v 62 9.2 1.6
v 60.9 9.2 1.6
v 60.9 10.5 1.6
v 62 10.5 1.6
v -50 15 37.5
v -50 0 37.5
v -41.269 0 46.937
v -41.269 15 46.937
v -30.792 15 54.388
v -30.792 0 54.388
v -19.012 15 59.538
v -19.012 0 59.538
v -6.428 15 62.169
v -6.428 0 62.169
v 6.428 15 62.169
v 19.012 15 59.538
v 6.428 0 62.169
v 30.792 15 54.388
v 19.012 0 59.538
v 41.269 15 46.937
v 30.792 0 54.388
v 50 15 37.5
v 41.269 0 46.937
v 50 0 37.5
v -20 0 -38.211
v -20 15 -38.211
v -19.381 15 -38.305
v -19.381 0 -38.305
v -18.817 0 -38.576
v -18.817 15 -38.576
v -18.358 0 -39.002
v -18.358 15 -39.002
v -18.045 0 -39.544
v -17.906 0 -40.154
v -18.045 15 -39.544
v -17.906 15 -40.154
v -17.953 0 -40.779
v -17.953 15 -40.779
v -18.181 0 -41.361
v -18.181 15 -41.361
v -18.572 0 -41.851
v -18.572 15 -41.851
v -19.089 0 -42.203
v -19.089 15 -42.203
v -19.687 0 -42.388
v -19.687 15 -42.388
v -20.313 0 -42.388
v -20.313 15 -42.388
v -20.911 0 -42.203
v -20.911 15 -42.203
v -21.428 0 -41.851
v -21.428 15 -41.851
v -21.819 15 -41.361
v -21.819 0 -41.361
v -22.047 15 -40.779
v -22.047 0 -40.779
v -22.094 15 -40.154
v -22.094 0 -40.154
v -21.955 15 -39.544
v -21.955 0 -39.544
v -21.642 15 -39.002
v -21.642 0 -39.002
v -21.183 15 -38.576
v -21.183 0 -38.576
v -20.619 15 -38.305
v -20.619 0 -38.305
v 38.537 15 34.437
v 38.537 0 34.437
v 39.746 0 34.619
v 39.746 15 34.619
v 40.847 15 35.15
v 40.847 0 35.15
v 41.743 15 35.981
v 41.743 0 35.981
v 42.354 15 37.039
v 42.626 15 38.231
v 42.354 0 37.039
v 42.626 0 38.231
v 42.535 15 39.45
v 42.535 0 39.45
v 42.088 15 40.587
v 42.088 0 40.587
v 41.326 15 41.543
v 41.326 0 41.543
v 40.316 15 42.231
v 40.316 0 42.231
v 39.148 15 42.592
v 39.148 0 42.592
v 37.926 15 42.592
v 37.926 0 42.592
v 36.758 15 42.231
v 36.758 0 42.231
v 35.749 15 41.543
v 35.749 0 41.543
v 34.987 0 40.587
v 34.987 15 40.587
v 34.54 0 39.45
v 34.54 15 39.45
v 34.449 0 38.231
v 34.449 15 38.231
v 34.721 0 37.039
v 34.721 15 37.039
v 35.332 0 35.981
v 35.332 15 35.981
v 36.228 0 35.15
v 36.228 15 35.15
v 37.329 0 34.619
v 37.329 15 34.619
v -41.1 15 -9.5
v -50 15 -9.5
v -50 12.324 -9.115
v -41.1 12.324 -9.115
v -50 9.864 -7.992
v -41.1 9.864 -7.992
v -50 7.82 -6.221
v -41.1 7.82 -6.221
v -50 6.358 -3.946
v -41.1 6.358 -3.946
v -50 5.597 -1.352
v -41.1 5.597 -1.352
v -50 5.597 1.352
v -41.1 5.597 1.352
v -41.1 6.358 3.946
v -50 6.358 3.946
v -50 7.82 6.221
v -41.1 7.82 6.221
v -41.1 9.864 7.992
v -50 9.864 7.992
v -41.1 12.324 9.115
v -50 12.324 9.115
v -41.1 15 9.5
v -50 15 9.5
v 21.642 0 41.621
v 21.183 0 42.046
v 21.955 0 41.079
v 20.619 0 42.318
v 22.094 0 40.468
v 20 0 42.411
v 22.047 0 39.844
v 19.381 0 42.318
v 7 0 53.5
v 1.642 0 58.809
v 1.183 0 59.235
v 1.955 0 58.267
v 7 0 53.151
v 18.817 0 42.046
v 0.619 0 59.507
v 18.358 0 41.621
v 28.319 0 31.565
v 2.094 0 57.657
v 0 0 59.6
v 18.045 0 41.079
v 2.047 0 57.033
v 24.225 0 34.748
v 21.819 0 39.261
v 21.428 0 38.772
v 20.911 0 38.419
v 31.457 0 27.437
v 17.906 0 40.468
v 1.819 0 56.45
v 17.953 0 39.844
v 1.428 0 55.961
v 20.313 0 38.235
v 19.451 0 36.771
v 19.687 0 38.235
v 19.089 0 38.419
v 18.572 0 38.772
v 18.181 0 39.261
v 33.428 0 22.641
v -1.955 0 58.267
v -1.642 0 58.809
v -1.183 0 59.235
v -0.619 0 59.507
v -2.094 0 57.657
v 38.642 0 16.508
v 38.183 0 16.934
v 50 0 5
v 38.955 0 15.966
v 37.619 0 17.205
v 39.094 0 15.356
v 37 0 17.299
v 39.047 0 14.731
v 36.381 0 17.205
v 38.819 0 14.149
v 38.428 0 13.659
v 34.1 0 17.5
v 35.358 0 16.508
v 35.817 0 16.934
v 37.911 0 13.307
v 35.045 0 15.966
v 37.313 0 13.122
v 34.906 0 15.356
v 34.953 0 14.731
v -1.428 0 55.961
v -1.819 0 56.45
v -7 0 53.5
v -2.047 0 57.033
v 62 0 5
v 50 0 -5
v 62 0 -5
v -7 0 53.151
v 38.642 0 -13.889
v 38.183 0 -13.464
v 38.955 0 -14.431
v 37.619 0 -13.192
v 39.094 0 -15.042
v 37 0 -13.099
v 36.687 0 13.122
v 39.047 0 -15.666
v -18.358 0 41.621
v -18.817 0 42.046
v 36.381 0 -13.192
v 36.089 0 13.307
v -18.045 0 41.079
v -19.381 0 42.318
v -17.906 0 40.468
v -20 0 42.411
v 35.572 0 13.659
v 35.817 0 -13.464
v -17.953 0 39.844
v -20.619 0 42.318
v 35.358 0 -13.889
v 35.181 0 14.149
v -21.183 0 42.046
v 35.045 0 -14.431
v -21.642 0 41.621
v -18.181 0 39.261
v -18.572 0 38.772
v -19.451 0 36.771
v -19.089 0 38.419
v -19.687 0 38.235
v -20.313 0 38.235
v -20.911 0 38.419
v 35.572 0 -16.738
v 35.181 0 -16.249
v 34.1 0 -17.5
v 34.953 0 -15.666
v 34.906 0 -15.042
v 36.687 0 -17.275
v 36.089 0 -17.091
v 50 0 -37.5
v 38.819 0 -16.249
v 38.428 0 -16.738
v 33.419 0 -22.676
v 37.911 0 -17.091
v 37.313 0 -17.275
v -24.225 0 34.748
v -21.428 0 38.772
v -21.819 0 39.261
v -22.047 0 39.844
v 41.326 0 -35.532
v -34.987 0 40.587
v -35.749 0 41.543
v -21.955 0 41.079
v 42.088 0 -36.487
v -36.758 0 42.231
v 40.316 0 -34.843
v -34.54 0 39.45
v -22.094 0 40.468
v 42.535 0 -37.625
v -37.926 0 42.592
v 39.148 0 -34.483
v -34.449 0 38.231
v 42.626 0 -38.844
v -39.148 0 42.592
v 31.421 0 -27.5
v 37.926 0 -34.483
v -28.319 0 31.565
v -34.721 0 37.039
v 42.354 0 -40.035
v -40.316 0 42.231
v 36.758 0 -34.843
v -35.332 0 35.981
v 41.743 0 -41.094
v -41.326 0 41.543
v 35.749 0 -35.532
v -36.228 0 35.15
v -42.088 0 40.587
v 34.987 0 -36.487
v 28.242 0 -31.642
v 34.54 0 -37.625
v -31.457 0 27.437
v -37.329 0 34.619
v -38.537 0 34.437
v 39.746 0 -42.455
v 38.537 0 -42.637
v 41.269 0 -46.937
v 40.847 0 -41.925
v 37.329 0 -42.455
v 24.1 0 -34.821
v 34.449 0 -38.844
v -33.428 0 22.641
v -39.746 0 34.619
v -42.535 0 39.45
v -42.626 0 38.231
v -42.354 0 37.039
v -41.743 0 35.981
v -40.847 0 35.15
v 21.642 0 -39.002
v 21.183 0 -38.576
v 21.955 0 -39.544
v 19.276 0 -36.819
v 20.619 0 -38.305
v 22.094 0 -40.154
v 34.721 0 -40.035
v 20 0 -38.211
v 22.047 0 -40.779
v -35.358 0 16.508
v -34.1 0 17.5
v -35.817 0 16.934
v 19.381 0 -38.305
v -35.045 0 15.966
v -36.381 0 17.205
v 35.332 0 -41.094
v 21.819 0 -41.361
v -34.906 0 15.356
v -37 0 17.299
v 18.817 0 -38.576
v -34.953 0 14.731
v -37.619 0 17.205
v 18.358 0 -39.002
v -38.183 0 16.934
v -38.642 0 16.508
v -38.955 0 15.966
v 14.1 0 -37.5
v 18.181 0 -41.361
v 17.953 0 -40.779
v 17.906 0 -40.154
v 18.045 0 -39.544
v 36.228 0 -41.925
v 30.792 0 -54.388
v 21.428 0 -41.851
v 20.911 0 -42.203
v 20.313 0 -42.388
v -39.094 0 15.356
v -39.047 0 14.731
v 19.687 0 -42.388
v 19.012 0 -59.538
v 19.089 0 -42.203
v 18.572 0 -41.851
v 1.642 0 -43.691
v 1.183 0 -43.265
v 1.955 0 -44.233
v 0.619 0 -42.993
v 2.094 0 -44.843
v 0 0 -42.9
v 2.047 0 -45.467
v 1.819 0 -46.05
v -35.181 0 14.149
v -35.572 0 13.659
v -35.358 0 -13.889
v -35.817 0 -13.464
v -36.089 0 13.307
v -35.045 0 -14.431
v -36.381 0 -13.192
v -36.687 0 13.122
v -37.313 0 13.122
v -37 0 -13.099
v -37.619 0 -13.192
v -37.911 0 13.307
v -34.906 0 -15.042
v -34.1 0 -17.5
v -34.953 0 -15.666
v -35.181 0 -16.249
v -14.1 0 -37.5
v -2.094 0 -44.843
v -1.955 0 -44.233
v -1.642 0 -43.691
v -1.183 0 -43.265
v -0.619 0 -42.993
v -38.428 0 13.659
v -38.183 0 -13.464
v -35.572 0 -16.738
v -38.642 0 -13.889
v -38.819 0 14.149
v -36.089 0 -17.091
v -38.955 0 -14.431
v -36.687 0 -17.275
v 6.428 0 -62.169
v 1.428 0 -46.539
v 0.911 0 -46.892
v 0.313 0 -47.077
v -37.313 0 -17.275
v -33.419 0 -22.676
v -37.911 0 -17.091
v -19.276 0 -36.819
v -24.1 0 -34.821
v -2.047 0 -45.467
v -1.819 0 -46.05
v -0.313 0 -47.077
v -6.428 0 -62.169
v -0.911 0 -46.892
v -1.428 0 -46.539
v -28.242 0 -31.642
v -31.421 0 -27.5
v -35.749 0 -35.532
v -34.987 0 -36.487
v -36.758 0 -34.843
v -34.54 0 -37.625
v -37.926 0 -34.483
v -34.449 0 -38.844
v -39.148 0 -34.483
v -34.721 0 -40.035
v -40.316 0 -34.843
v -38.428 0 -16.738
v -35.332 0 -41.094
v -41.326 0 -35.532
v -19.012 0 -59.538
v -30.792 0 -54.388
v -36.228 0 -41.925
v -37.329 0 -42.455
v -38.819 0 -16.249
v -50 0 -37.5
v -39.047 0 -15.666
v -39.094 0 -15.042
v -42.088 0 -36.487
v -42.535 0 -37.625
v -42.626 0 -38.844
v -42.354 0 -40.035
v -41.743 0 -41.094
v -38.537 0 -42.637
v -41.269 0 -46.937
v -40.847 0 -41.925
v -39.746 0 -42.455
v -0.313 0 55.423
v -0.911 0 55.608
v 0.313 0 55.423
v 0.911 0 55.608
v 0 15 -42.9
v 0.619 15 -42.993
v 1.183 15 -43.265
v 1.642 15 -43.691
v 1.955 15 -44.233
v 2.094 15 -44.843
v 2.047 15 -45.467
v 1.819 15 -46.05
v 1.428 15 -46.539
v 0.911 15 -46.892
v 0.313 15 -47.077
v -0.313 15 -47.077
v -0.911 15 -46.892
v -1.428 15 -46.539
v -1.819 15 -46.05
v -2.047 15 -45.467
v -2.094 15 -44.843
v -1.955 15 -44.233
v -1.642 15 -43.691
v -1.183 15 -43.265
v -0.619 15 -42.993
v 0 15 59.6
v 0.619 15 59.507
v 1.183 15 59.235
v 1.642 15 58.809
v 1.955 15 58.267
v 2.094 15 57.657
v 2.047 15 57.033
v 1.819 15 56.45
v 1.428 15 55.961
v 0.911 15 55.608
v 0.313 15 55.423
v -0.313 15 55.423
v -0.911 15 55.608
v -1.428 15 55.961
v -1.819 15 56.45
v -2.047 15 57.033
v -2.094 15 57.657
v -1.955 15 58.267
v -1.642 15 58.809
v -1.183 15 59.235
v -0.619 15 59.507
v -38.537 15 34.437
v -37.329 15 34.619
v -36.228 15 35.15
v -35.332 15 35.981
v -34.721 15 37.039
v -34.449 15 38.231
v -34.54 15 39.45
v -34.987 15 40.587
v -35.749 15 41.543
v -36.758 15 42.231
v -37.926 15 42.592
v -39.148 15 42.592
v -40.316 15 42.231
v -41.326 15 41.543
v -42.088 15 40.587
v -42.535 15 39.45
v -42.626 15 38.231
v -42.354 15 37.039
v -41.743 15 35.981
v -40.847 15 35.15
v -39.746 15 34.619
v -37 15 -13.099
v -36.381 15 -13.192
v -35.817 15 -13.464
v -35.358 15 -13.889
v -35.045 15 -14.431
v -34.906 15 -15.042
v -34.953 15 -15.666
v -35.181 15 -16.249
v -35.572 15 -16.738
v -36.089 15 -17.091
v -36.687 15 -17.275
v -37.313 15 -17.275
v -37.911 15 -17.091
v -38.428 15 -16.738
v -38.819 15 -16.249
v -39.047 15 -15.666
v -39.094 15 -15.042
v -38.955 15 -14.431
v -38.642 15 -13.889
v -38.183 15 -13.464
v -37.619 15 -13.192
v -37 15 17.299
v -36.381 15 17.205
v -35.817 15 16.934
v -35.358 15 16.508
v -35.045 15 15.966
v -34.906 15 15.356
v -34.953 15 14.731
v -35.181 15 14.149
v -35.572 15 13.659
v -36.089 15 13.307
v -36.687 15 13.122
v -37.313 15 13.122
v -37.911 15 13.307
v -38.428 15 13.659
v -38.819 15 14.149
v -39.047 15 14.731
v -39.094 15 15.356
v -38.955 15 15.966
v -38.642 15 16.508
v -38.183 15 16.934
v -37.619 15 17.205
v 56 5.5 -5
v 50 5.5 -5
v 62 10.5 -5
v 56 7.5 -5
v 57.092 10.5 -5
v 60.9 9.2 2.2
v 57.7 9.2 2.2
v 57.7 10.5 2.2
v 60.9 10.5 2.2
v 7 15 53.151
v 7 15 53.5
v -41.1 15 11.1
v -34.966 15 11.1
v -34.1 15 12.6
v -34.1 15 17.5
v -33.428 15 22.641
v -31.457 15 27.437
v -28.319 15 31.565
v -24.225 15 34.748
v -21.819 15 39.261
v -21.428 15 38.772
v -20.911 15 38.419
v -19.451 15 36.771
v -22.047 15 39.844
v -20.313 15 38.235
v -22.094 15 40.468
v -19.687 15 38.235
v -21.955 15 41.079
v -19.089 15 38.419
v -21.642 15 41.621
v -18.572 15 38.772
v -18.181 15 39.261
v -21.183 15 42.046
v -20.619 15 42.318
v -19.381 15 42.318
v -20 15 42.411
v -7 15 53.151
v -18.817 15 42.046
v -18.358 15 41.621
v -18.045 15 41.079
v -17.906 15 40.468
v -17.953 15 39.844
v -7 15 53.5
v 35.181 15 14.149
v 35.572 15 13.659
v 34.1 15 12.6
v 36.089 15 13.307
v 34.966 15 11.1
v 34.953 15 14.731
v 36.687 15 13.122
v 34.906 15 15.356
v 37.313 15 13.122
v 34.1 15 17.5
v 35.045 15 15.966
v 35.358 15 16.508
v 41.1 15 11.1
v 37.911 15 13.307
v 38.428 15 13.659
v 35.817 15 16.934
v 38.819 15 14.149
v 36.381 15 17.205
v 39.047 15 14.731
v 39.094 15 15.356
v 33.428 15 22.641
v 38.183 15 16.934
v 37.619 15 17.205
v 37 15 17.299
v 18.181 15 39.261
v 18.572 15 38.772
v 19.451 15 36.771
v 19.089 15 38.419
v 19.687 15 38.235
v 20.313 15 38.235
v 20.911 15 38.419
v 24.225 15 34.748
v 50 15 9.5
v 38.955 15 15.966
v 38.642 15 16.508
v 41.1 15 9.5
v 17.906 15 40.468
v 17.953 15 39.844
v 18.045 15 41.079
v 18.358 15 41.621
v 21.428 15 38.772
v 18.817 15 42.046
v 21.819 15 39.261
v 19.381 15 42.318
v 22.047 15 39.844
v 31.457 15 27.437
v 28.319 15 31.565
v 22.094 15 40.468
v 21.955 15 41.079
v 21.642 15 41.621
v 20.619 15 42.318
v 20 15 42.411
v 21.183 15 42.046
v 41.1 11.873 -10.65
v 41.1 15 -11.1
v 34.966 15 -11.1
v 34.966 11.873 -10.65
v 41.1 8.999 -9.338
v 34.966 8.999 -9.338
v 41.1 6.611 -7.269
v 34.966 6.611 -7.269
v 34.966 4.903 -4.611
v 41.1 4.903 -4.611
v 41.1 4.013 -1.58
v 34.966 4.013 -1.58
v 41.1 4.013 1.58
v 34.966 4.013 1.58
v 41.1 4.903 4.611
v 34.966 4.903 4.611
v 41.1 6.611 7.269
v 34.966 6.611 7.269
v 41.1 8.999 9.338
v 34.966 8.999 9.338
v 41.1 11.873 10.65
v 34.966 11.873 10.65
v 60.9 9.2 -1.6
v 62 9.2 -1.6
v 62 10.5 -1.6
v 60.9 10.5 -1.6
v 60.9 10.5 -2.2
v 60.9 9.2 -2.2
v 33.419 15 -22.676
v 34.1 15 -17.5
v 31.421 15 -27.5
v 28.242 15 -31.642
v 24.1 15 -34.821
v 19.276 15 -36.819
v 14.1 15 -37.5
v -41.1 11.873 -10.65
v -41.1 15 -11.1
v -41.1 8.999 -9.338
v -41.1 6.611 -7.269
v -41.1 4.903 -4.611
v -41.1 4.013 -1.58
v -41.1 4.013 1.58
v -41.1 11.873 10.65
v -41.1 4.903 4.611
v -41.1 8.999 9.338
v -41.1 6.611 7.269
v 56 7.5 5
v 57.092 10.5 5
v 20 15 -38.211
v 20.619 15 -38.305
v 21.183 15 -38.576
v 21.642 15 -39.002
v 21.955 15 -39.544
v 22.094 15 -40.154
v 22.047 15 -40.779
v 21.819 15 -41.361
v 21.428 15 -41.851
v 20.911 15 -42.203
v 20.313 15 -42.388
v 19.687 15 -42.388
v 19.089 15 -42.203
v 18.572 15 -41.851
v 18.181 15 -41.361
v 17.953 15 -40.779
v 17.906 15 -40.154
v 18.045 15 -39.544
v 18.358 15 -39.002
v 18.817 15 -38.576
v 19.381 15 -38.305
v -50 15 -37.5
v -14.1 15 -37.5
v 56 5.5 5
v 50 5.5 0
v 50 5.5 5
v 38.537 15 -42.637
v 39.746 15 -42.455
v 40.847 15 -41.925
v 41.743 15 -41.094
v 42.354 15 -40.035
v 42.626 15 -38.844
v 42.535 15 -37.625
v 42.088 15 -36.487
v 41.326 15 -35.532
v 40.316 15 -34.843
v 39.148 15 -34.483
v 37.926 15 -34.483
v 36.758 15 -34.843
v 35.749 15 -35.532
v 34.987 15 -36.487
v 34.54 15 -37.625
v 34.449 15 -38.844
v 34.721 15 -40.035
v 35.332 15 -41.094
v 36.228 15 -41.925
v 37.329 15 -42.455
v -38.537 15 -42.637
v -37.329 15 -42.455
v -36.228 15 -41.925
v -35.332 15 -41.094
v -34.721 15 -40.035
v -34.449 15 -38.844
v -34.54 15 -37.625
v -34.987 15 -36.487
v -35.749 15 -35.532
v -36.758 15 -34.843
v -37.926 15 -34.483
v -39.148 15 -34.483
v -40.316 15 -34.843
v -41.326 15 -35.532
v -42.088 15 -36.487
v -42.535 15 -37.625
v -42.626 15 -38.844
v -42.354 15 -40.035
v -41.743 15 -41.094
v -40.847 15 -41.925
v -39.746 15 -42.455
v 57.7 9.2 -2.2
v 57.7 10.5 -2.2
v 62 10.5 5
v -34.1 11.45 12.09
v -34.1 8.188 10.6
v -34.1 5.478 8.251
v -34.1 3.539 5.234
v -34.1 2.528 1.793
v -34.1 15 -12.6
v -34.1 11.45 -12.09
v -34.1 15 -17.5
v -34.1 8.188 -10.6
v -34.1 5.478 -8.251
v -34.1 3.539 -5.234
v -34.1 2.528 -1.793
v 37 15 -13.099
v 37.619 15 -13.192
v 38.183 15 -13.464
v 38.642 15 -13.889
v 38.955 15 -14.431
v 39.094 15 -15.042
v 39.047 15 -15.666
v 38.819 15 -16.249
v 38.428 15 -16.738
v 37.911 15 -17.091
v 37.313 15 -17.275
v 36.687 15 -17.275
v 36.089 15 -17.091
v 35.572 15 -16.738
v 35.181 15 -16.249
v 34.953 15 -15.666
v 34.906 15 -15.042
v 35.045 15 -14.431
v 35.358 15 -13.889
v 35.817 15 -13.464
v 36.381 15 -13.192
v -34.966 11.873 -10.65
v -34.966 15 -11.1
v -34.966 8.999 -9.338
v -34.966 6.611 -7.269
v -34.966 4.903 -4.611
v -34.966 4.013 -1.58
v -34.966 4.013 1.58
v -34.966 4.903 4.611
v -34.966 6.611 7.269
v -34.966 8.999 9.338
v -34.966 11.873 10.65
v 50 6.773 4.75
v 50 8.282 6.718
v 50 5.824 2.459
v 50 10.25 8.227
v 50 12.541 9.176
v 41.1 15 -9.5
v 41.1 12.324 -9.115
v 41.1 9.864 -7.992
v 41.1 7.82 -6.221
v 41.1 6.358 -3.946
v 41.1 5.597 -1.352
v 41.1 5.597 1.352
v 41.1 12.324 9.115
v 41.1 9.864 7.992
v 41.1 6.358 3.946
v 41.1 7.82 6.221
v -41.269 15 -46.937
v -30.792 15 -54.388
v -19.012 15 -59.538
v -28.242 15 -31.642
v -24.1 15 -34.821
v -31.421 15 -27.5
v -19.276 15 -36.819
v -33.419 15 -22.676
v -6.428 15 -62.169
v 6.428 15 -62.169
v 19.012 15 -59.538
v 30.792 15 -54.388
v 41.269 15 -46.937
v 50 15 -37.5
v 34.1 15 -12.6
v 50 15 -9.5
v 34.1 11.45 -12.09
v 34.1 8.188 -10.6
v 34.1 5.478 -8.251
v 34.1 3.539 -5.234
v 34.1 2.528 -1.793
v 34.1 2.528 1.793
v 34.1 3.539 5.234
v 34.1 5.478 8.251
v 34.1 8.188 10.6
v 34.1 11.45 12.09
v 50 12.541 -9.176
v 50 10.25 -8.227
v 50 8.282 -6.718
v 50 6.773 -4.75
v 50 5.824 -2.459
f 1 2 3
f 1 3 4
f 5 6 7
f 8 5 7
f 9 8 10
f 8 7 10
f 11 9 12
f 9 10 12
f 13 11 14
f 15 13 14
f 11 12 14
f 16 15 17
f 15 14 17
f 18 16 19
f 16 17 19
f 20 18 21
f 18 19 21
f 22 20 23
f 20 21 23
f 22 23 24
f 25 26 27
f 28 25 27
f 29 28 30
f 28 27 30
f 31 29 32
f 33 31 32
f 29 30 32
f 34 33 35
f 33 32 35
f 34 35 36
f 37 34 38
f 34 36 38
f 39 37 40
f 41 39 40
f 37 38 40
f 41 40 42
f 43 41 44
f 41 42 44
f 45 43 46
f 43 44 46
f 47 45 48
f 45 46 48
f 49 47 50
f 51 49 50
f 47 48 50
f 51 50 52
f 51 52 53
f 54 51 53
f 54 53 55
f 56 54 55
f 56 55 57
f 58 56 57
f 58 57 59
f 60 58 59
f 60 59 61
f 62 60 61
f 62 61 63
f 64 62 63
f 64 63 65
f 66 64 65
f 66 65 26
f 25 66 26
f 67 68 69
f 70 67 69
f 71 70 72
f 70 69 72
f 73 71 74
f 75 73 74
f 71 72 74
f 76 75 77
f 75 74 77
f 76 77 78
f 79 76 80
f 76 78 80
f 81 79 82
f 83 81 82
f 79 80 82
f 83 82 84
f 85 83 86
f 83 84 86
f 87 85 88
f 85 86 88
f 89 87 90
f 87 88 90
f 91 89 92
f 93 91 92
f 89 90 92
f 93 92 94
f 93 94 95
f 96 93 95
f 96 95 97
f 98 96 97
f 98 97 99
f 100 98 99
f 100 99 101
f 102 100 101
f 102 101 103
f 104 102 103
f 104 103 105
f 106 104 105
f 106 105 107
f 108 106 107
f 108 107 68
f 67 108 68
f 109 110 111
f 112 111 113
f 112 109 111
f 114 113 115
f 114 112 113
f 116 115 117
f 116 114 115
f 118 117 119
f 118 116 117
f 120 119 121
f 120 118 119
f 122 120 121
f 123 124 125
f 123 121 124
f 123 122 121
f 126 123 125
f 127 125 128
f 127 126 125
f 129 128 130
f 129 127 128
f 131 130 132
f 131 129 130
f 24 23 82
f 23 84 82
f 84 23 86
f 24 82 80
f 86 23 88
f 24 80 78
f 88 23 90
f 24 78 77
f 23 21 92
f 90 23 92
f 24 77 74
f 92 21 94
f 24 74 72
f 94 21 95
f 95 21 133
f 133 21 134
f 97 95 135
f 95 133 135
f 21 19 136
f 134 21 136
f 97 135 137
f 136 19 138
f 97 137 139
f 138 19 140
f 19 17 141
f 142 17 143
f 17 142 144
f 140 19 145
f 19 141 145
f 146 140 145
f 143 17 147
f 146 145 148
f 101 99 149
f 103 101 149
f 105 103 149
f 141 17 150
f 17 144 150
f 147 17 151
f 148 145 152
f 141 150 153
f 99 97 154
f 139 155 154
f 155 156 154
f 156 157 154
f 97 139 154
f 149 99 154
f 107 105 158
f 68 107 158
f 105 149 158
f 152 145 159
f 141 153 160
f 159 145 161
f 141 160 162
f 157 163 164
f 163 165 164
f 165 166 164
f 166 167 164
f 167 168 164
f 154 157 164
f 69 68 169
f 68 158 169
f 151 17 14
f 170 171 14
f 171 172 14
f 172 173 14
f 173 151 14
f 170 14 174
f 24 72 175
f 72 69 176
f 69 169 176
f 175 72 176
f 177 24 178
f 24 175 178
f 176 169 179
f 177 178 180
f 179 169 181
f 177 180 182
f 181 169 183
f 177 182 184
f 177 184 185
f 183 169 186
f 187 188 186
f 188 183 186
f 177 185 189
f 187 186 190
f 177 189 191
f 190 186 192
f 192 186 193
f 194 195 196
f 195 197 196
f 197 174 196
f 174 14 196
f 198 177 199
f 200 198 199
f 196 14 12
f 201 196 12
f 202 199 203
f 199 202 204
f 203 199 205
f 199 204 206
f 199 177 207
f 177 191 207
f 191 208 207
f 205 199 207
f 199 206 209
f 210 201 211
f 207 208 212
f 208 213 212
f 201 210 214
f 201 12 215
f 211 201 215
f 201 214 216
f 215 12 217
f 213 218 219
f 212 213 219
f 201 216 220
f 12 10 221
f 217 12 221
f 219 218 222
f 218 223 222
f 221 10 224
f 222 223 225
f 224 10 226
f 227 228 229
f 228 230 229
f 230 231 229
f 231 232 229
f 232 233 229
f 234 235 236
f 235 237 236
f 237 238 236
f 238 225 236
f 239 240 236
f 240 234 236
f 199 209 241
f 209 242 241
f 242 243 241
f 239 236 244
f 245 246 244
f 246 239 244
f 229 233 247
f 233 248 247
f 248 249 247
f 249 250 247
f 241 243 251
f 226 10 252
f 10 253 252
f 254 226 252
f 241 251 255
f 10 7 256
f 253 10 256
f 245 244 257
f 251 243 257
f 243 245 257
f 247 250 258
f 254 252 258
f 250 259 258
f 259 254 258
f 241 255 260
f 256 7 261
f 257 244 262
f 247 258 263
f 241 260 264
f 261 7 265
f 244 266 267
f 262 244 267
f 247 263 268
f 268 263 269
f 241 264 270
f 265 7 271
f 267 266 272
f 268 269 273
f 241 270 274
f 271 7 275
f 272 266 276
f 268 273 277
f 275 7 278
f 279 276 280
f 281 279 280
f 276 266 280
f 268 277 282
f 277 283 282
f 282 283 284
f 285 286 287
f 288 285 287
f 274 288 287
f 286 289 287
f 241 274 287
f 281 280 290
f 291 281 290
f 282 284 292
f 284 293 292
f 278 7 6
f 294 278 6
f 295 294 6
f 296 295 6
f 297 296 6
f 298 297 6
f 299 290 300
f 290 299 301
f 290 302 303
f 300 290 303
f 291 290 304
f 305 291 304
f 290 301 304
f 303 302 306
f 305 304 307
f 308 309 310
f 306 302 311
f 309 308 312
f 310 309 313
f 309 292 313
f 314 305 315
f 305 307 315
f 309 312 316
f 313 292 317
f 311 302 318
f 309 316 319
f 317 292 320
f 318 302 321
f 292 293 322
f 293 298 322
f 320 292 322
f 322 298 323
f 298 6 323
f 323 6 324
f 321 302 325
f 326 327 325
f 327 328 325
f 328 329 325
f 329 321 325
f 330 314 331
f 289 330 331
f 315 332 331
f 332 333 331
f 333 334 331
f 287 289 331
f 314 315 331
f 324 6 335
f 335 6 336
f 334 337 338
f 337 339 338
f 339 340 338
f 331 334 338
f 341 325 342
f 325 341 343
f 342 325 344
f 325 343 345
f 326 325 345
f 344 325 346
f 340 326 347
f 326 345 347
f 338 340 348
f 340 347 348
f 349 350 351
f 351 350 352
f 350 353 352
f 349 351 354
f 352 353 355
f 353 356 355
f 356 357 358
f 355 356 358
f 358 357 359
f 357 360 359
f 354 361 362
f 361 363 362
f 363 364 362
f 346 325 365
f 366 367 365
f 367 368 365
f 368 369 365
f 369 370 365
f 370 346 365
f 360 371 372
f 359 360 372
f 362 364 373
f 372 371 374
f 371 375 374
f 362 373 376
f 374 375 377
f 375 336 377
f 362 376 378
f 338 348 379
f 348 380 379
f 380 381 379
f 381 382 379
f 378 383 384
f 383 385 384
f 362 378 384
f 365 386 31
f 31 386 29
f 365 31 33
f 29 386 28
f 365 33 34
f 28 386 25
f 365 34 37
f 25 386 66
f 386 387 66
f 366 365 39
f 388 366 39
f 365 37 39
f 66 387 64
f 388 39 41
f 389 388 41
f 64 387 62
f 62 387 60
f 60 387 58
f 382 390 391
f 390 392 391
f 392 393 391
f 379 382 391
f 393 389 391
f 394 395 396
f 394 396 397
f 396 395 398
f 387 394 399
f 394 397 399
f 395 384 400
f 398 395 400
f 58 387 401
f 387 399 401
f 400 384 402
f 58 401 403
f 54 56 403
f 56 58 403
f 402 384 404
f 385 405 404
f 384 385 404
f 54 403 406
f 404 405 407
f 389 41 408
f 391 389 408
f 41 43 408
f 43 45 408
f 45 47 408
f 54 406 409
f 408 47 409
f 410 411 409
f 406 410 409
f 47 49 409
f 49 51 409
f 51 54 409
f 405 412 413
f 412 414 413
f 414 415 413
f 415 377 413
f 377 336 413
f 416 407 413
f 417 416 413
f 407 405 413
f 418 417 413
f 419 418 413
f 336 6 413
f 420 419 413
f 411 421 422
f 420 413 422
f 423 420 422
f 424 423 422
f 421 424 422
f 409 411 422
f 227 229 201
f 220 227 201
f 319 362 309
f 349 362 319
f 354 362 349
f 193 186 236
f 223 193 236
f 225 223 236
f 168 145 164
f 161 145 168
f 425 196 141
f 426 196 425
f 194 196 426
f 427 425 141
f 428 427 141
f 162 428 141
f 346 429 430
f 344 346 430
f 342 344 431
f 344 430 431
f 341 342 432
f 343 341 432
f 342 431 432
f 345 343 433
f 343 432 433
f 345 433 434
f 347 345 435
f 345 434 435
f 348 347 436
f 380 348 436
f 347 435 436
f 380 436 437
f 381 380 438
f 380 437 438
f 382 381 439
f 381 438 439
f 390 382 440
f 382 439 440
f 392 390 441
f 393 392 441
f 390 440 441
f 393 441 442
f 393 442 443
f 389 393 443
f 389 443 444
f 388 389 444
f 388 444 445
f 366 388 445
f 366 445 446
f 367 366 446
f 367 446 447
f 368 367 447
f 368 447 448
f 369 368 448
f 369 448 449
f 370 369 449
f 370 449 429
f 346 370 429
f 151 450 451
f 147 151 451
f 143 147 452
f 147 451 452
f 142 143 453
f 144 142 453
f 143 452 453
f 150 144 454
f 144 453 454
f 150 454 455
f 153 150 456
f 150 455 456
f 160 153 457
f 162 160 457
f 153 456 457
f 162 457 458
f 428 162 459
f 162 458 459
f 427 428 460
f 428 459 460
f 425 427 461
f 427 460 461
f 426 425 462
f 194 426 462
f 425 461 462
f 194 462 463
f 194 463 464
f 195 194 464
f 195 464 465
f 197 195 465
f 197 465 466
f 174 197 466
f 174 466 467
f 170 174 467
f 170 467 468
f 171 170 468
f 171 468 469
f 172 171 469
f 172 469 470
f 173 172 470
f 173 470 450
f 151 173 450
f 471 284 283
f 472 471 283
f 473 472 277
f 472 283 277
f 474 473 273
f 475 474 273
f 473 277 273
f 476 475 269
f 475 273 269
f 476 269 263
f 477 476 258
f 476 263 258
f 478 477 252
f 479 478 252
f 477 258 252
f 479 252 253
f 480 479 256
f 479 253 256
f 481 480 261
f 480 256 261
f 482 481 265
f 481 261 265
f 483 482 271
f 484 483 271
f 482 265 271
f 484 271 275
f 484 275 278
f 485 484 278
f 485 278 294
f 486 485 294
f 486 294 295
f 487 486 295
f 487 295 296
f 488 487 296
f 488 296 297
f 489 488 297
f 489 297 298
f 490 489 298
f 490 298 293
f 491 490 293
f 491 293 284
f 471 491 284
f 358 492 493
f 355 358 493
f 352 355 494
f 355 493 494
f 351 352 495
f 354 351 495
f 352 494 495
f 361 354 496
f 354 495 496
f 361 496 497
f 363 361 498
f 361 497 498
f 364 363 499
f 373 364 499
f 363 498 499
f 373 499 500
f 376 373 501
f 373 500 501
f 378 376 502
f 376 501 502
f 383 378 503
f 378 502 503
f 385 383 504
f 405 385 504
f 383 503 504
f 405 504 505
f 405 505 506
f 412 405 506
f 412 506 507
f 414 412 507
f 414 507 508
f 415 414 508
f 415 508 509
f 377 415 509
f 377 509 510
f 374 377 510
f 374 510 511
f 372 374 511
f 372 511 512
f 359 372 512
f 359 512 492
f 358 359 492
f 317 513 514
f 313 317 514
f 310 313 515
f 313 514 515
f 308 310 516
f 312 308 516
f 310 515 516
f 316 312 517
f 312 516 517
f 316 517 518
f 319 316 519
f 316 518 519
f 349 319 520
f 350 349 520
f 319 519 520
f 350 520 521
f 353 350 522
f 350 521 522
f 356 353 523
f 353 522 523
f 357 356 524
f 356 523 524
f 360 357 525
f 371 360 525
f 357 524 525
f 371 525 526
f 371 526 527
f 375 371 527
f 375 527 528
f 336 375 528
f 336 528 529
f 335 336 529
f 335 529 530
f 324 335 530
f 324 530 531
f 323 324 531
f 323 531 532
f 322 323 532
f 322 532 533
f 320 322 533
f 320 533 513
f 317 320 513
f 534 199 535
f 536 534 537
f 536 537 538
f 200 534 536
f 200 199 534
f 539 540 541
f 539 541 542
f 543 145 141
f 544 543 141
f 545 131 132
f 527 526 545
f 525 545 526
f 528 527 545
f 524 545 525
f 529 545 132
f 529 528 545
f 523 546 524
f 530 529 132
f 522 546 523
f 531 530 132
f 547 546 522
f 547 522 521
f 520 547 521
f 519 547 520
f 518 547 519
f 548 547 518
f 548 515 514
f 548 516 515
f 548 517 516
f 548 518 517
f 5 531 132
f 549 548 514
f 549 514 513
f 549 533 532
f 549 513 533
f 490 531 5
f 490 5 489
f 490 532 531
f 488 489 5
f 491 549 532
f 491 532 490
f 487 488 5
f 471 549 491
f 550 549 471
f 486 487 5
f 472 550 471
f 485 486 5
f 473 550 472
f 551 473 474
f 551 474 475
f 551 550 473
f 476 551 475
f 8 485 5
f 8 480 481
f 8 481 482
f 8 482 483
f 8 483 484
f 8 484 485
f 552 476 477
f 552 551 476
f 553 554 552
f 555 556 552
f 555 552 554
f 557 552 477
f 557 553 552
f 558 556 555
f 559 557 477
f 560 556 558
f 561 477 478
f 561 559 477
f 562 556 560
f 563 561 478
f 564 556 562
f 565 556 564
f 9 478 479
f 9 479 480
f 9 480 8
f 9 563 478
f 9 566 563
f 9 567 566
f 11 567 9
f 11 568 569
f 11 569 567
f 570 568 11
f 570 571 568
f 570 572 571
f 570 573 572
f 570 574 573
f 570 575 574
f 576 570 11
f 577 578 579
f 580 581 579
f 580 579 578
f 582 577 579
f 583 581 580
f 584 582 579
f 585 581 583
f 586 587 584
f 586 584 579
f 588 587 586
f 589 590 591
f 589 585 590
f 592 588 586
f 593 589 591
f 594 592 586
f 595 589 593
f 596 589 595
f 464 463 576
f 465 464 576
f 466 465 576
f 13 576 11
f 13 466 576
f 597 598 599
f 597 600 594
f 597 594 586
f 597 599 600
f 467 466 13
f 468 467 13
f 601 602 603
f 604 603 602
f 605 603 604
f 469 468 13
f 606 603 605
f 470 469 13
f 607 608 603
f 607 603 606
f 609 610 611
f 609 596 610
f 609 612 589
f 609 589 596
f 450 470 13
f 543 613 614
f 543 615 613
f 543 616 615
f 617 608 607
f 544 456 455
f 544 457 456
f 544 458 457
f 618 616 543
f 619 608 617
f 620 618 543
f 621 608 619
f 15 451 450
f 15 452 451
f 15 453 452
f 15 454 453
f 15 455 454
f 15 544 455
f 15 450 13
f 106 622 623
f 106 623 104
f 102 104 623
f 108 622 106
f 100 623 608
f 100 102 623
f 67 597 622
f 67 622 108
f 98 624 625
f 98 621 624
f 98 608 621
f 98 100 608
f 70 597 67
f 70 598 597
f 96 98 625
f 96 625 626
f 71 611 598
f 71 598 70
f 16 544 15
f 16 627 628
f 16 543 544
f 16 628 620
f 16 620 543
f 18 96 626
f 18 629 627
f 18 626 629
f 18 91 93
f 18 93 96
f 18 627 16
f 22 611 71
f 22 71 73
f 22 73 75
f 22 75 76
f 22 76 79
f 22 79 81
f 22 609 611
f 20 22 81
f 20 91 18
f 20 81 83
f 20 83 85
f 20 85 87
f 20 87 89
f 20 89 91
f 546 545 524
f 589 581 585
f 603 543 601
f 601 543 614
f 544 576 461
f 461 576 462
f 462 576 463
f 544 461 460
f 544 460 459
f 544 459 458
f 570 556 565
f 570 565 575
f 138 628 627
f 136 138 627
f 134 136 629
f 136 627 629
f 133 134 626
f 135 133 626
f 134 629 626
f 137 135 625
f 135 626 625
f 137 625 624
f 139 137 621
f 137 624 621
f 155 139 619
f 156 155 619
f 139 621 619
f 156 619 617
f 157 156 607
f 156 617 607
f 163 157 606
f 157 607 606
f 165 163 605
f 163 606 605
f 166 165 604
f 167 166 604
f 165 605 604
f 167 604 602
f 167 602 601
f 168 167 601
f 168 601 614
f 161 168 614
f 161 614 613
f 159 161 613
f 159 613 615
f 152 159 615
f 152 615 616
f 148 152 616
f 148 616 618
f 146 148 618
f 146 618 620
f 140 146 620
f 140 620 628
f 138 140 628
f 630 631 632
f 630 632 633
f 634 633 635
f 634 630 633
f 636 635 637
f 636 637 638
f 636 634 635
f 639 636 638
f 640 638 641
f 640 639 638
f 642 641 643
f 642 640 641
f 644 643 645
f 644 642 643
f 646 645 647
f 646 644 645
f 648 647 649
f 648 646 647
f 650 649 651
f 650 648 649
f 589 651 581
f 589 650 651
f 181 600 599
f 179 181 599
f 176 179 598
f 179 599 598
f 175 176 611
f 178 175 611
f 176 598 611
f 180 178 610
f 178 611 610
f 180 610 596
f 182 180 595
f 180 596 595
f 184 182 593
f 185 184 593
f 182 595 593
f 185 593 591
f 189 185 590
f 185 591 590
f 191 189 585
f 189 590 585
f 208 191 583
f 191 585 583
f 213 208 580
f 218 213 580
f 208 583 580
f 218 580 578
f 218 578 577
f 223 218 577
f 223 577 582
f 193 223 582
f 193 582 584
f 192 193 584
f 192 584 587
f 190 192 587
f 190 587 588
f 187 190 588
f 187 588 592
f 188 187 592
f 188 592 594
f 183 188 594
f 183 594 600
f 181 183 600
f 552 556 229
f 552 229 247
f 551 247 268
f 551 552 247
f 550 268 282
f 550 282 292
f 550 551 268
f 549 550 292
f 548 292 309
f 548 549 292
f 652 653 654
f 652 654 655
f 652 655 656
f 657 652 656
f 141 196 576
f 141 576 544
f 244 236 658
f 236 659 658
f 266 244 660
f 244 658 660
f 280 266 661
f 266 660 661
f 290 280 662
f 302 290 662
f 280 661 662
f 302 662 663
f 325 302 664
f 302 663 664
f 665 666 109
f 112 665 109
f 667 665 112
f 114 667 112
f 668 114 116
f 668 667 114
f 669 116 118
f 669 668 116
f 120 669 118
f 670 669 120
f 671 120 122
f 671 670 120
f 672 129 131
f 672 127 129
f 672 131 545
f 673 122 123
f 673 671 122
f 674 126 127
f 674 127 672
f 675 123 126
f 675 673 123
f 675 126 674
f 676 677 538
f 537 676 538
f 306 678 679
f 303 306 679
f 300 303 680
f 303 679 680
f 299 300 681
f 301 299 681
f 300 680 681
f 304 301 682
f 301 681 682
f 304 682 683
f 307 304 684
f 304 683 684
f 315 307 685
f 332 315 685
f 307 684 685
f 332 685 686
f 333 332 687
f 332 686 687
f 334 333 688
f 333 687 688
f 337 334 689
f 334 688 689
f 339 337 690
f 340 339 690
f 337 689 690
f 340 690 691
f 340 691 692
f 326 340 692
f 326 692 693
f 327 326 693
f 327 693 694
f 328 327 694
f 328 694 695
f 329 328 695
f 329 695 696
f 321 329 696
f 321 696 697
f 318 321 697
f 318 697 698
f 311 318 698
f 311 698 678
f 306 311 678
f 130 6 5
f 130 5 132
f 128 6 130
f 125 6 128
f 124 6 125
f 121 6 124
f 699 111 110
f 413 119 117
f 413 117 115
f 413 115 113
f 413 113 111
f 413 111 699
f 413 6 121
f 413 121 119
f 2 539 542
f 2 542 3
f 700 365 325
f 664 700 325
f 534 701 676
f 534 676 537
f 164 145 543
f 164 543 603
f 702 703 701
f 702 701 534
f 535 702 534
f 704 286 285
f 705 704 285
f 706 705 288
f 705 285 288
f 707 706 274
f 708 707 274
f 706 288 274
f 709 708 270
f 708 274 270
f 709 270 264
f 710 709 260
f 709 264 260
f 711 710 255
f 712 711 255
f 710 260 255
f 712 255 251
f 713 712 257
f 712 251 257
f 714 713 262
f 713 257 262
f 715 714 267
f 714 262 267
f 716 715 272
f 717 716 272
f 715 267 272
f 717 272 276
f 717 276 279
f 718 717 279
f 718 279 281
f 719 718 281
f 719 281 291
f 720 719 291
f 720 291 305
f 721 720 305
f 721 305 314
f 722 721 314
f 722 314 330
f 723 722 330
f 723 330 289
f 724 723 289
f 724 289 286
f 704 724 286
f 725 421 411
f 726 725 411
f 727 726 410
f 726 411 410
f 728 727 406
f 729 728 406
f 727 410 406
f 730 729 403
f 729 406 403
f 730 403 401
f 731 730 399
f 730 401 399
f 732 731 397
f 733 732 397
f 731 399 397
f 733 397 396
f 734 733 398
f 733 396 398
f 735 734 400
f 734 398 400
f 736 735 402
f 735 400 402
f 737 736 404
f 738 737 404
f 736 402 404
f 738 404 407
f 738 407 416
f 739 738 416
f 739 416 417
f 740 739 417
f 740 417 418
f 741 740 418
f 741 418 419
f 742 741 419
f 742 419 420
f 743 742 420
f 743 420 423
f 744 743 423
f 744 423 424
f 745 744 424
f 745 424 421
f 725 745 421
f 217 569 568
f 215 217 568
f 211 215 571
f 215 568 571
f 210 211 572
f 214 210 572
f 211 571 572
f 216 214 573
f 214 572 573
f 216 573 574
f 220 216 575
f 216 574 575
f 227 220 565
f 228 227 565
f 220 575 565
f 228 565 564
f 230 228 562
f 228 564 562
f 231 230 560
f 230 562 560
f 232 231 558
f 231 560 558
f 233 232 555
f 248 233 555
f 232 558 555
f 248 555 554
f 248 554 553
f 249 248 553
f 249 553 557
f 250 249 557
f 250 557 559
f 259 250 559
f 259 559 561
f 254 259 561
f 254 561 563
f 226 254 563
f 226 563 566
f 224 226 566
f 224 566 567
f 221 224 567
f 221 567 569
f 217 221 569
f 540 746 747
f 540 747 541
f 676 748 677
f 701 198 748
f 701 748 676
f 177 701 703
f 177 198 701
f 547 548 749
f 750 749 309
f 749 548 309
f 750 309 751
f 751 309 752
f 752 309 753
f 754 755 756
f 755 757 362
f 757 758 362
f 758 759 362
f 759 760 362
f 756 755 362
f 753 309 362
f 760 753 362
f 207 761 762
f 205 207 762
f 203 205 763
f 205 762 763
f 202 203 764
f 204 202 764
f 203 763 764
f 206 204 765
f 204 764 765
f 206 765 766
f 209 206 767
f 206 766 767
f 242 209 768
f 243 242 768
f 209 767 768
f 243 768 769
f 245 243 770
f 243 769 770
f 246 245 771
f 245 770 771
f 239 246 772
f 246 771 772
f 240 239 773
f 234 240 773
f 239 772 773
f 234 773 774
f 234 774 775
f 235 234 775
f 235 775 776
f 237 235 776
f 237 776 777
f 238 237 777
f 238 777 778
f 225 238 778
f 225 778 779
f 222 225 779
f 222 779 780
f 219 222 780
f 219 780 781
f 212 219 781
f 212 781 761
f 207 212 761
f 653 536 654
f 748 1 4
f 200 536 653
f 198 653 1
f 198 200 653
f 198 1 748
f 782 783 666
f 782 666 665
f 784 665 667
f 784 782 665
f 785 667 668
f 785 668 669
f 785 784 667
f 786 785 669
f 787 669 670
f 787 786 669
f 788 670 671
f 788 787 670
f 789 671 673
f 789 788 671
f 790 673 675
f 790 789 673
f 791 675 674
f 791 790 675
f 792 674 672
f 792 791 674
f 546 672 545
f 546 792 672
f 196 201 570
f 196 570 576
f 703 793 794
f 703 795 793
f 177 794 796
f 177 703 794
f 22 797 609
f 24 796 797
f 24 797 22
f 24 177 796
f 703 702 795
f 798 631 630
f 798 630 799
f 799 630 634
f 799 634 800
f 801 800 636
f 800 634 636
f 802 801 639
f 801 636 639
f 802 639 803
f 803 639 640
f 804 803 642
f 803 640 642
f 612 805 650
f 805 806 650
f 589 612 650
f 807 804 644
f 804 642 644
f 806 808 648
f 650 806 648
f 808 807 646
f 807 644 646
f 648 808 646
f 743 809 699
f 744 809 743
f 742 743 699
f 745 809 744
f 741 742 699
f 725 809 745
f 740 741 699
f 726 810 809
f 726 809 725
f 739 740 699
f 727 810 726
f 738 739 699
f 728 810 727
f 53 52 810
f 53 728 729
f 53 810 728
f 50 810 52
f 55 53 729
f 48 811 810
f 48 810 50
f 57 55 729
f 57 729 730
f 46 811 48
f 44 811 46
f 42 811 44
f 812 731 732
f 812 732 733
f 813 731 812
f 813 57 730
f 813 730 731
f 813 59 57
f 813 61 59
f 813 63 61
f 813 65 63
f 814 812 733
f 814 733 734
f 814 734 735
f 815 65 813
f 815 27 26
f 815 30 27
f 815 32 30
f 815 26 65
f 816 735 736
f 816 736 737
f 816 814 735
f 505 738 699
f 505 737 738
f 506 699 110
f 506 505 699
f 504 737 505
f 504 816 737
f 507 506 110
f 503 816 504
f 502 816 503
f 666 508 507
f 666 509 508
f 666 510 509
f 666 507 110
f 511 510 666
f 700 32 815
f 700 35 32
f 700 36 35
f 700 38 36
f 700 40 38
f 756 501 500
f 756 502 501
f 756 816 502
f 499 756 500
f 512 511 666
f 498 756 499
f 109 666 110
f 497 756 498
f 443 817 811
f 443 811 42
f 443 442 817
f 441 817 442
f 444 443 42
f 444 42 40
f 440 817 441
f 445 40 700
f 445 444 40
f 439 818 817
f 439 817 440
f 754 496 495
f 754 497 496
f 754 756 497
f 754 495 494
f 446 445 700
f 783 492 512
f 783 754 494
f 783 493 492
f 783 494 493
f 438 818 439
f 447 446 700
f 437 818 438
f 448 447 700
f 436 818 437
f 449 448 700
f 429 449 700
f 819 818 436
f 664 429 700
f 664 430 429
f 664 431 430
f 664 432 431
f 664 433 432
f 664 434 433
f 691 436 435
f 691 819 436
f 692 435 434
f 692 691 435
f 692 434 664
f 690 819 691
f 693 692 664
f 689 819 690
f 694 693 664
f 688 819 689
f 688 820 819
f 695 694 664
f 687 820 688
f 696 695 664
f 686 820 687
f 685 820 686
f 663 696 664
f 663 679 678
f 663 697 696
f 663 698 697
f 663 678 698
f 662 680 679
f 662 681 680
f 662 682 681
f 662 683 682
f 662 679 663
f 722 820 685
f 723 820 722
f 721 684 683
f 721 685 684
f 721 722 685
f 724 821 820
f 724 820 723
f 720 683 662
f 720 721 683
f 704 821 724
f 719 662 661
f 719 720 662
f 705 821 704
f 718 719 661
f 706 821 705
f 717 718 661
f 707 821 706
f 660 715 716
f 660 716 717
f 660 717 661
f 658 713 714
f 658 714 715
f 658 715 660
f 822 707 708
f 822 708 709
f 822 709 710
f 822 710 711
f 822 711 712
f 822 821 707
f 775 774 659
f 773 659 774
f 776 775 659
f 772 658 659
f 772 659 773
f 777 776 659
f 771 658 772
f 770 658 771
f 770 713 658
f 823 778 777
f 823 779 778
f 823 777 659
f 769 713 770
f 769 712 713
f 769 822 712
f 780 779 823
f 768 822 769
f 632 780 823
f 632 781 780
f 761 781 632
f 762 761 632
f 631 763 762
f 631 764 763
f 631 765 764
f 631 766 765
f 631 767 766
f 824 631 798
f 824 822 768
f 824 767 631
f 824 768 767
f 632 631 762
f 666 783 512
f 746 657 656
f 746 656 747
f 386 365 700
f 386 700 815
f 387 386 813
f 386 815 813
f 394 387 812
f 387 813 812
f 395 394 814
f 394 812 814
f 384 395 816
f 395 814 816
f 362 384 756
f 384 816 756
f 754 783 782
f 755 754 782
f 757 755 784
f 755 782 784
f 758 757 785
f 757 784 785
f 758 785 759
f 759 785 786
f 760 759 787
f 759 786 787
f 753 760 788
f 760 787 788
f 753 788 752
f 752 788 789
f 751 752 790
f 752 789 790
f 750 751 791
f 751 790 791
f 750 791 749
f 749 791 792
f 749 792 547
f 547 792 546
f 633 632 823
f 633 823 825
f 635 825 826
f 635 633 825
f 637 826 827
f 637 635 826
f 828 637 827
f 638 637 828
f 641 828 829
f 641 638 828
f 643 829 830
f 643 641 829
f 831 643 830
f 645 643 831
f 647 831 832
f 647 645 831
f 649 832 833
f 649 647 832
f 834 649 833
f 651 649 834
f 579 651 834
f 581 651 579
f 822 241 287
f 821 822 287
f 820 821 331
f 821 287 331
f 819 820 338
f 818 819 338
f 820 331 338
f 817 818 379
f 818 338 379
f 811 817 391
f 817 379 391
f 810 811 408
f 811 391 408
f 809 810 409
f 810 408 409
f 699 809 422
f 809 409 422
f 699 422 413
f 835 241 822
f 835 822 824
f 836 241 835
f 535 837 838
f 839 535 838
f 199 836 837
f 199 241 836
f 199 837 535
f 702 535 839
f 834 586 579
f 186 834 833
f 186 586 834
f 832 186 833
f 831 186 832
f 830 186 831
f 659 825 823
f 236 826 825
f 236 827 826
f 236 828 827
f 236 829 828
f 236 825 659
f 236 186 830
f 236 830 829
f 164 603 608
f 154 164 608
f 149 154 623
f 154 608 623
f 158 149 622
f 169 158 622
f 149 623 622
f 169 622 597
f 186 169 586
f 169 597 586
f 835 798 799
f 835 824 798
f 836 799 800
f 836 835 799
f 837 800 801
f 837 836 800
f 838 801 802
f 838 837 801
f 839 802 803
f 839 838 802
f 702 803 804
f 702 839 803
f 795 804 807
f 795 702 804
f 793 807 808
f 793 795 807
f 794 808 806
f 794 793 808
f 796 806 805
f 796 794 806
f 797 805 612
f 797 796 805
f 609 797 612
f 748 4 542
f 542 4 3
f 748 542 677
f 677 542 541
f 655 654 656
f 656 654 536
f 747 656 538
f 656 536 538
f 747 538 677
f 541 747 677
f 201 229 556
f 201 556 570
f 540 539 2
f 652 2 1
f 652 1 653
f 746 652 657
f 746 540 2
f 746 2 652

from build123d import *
from OCP.BRepFilletAPI import BRepFilletAPI_MakeChamfer

# Parameters (mm, degrees)
SKETCH2_R               = 62.5
SKETCH2_W               = 68.2
SKETCH2_H               = 75
BOSS_EXTRUDE1_DEPTH     = 15
SKETCH7_W               = 7
SKETCH7_H               = 11.1
CUT_EXTRUDE1_DEPTH      = 122.918866465
CUT_EXTRUDE1_DEPTH_BACK = 122.918866465
SKETCH8_R               = 9.5
FILLET1_R               = 20
SKETCH9_R               = 2.1
CUT_EXTRUDE2_DEPTH      = 90.652105542
CHAMFER1_SIZE           = 1.5
CHAMFER1_SIZE2          = 0.866025404
SKETCH10_R              = 4.1
CUT_EXTRUDE3_DEPTH      = 90.652105542
CUT_EXTRUDE4_DEPTH      = 90.652105542
SKETCH12_W              = 10
SKETCH12_H              = 5.5
BOSS_EXTRUDE2_DEPTH     = 12
BOSS_EXTRUDE3_START     = 6
SKETCH14_W              = 10
SKETCH14_H              = 3.7
BOSS_EXTRUDE3_DEPTH     = 6
BOSS_EXTRUDE4_DEPTH     = 1.3
CHAMFER2_SIZE           = 3
CHAMFER2_SIZE2          = 1.091910703
SKETCH16_W              = 14
SKETCH16_H              = 16
CUT_EXTRUDE5_DEPTH      = 90.652105542
CHAMFER3_DEPTH          = 15
CUT_EXTRUDE6_DEPTH      = 90.652105542


with BuildPart() as part:
    # Sketch2 → Boss-Extrude1 (new body)
    with BuildSketch(Plane(origin=(0, 0, 0), x_dir=(1, 0, 0), z_dir=(0, 1, 0))):
        with Locations(Location((0, 0, 0), (0, 0, 270))):
            Circle(SKETCH2_R)
        Rectangle(SKETCH2_W, SKETCH2_H, mode=Mode.SUBTRACT)
    extrude(amount=BOSS_EXTRUDE1_DEPTH)

    # Sketch7 → Cut-Revolve2 (revolve, cut)
    with BuildSketch(Plane(origin=(0, 15, 0), x_dir=(1, 0, 0), z_dir=(0, 1, 0))):
        with Locations((-37.6, 5.55)):
            Rectangle(SKETCH7_W, SKETCH7_H)
        with Locations((37.6, 5.55)):
            Rectangle(SKETCH7_W, SKETCH7_H)
    revolve(axis=Axis((62.5, 15, 0), (-1, 0, 0)), mode=Mode.SUBTRACT)

    # Sketch8 → Cut-Extrude1 (cut, two sides: drawn at the far end of the back side and taken through both)
    with BuildSketch(Plane.ZY.offset(-41.1).offset(-CUT_EXTRUDE1_DEPTH_BACK)):
        with Locations((0, 15)):
            Circle(SKETCH8_R)
    extrude(amount=CUT_EXTRUDE1_DEPTH + CUT_EXTRUDE1_DEPTH_BACK, mode=Mode.SUBTRACT)

    # Fillet1
    fillet1_edges = [part.edges().sort_by_distance(p)[0] for p in [
        (-34.1, 7.5, -37.5),
        (-34.1, 7.5, 37.5),
        (34.1, 7.5, 37.5),
        (34.1, 7.5, -37.5),
    ]]
    fillet(fillet1_edges, radius=FILLET1_R)

    # Sketch9 → Cut-Extrude2 (cut, through all)
    with BuildSketch(Plane(origin=(0, 15, 0), x_dir=(1, 0, 0), z_dir=(0, 1, 0))):
        with Locations(Location((-37, 15.198684154, 0), (0, 0, 270))):
            Circle(SKETCH9_R)
        with Locations(Location((37, 15.198684154, 0), (0, 0, 270))):
            Circle(SKETCH9_R)
        with Locations(Location((37, -15.198684154, 0), (0, 0, 270))):
            Circle(SKETCH9_R)
        with Locations(Location((-37, -15.198684154, 0), (0, 0, 270))):
            Circle(SKETCH9_R)
        with Locations(Location((-20, 40.311288741, 0), (0, 0, 270))):
            Circle(SKETCH9_R)
        with Locations(Location((20, 40.311288741, 0), (0, 0, 270))):
            Circle(SKETCH9_R)
        with Locations(Location((20, -40.311288741, 0), (0, 0, 270))):
            Circle(SKETCH9_R)
        with Locations(Location((-20, -40.311288741, 0), (0, 0, 270))):
            Circle(SKETCH9_R)
        with Locations(Location((0, 45, 0), (0, 0, 270))):
            Circle(SKETCH9_R)
        with Locations(Location((0, -57.5, 0), (0, 0, 270))):
            Circle(SKETCH9_R)
    extrude(amount=-CUT_EXTRUDE2_DEPTH, mode=Mode.SUBTRACT)

    # Chamfer1: one chamfer whose edges measure the first distance from different faces: ONE call of the kernel's chamfer builder (chamfer() names one face for all edges)
    chamfer1_edges_1 = [part.edges().sort_by_distance(p)[0] for p in [
        (-34.1, 3.9, 0),
    ]]
    chamfer1_side_1 = [part.faces().sort_by_distance(p)[0] for p in [
        (-34.1, 0.380788655, 0),
    ]]
    chamfer1_edges_2 = [part.edges().sort_by_distance(p)[0] for p in [
        (34.1, 3.9, 0),
    ]]
    chamfer1_side_2 = [part.faces().sort_by_distance(p)[0] for p in [
        (34.1, 0.380788655, 0),
    ]]
    chamfer1 = BRepFilletAPI_MakeChamfer(part.part.solid().wrapped)
    for e in chamfer1_edges_1:
        chamfer1.Add(CHAMFER1_SIZE, CHAMFER1_SIZE2, e.wrapped, chamfer1_side_1[0].wrapped)  # the first distance lies on this face
    for e in chamfer1_edges_2:
        chamfer1.Add(CHAMFER1_SIZE, CHAMFER1_SIZE2, e.wrapped, chamfer1_side_2[0].wrapped)  # the first distance lies on this face
    add(Compound.cast(chamfer1.Shape()), mode=Mode.REPLACE)

    # Sketch10 → Cut-Extrude3 (cut, through all)
    with BuildSketch(Plane.XZ):
        with Locations(Location((38.537319575, -38.537319575, 0), (0, 0, 270))):
            Circle(SKETCH10_R)
        with Locations(Location((-38.537319575, -38.537319575, 0), (0, 0, 270))):
            Circle(SKETCH10_R)
        with Locations(Location((-38.537319575, 38.537319575, 0), (0, 0, 270))):
            Circle(SKETCH10_R)
        with Locations(Location((38.537319575, 38.537319575, 0), (0, 0, 270))):
            Circle(SKETCH10_R)
    extrude(amount=-CUT_EXTRUDE3_DEPTH, mode=Mode.SUBTRACT)

    # Sketch11 → Cut-Extrude4 (cut, through all)
    with BuildSketch(Plane.XZ):
        with BuildLine():
            Line((50, -37.5), (50, 37.5))
            ThreePointArc((50, 37.5), (62.5, 0), (50, -37.5))
        make_face()
    extrude(amount=-CUT_EXTRUDE4_DEPTH, mode=Mode.SUBTRACT)

    # Sketch12 → Boss-Extrude2 (add)
    with BuildSketch(Plane(origin=(50, 0, 0), x_dir=(0, 0, -1), z_dir=(1, 0, 0))):
        with Locations((0, 2.75)):
            Rectangle(SKETCH12_W, SKETCH12_H)
    extrude(amount=BOSS_EXTRUDE2_DEPTH)

    # Sketch14 → Boss-Extrude3 (add)
    with BuildSketch(Plane(origin=(50, 0, 0), x_dir=(0, 0, -1), z_dir=(1, 0, 0)).offset(BOSS_EXTRUDE3_START)):
        with Locations((0, 7.35)):
            Rectangle(SKETCH14_W, SKETCH14_H)
    extrude(amount=BOSS_EXTRUDE3_DEPTH)

    # Sketch15 → Boss-Extrude4 (add)
    with BuildSketch(Plane(origin=(0, 9.2, 0), x_dir=(1, 0, 0), z_dir=(0, 1, 0))):
        Polygon((60.9, -2.2), (60.9, -1.6), (62, -1.6), (62, -5), (56, -5), (56, 5), (62, 5), (62, 1.6), (60.9, 1.6), (60.9, 2.2), (57.7, 2.2), (57.7, -2.2), align=None)
    extrude(amount=BOSS_EXTRUDE4_DEPTH)

    # Chamfer2
    chamfer2_edges = [part.edges().sort_by_distance(p)[0] for p in [
        (56, 10.5, 0),
    ]]
    chamfer2_side = [part.faces().sort_by_distance(p)[0] for p in [
        (56, 8, 0),
    ]]
    chamfer(chamfer2_edges, length=CHAMFER2_SIZE, length2=CHAMFER2_SIZE2, reference=chamfer2_side[0])

    # Sketch16 → Cut-Extrude5 (cut, through all)
    with BuildSketch(Plane.XZ):
        with Locations((0, 45.5)):
            Rectangle(SKETCH16_W, SKETCH16_H)
    extrude(amount=-CUT_EXTRUDE5_DEPTH, mode=Mode.SUBTRACT)

    # Chamfer3: read off the stored shape, not the designer's step
    # Chamfer3 outline → Chamfer3 (cut)
    with BuildSketch(Plane(origin=(0, 0, 0), x_dir=(1, 0, 0), z_dir=(0, 1, 0))):
        with BuildLine():
            Line((7, -53.150946691), (19.451351351, -36.770781996))
            ThreePointArc((19.451351351, -36.770781996), (16.800403682, -37.316856965), (14.1, -37.5))
            Line((14.1, -37.5), (7, -37.5))
            Line((7, -37.5), (7, -53.150946691))
        make_face()
        with BuildLine():
            ThreePointArc((-14.1, -37.5), (-16.800403682, -37.316856965), (-19.451351351, -36.770781996))
            Line((-19.451351351, -36.770781996), (-7, -53.150946691))
            Line((-7, -53.150946691), (-7, -37.5))
            Line((-7, -37.5), (-14.1, -37.5))
        make_face()
    extrude(amount=CHAMFER3_DEPTH, mode=Mode.SUBTRACT)

    # Sketch18 → Cut-Extrude6 (cut, through all)
    with BuildSketch(Plane.XZ):
        with BuildLine():
            Line((-50, 37.5), (-50, -37.5))
            ThreePointArc((-50, -37.5), (-62.5, 0), (-50, 37.5))
        make_face()
    extrude(amount=-CUT_EXTRUDE6_DEPTH, mode=Mode.SUBTRACT)


solid = part.part
